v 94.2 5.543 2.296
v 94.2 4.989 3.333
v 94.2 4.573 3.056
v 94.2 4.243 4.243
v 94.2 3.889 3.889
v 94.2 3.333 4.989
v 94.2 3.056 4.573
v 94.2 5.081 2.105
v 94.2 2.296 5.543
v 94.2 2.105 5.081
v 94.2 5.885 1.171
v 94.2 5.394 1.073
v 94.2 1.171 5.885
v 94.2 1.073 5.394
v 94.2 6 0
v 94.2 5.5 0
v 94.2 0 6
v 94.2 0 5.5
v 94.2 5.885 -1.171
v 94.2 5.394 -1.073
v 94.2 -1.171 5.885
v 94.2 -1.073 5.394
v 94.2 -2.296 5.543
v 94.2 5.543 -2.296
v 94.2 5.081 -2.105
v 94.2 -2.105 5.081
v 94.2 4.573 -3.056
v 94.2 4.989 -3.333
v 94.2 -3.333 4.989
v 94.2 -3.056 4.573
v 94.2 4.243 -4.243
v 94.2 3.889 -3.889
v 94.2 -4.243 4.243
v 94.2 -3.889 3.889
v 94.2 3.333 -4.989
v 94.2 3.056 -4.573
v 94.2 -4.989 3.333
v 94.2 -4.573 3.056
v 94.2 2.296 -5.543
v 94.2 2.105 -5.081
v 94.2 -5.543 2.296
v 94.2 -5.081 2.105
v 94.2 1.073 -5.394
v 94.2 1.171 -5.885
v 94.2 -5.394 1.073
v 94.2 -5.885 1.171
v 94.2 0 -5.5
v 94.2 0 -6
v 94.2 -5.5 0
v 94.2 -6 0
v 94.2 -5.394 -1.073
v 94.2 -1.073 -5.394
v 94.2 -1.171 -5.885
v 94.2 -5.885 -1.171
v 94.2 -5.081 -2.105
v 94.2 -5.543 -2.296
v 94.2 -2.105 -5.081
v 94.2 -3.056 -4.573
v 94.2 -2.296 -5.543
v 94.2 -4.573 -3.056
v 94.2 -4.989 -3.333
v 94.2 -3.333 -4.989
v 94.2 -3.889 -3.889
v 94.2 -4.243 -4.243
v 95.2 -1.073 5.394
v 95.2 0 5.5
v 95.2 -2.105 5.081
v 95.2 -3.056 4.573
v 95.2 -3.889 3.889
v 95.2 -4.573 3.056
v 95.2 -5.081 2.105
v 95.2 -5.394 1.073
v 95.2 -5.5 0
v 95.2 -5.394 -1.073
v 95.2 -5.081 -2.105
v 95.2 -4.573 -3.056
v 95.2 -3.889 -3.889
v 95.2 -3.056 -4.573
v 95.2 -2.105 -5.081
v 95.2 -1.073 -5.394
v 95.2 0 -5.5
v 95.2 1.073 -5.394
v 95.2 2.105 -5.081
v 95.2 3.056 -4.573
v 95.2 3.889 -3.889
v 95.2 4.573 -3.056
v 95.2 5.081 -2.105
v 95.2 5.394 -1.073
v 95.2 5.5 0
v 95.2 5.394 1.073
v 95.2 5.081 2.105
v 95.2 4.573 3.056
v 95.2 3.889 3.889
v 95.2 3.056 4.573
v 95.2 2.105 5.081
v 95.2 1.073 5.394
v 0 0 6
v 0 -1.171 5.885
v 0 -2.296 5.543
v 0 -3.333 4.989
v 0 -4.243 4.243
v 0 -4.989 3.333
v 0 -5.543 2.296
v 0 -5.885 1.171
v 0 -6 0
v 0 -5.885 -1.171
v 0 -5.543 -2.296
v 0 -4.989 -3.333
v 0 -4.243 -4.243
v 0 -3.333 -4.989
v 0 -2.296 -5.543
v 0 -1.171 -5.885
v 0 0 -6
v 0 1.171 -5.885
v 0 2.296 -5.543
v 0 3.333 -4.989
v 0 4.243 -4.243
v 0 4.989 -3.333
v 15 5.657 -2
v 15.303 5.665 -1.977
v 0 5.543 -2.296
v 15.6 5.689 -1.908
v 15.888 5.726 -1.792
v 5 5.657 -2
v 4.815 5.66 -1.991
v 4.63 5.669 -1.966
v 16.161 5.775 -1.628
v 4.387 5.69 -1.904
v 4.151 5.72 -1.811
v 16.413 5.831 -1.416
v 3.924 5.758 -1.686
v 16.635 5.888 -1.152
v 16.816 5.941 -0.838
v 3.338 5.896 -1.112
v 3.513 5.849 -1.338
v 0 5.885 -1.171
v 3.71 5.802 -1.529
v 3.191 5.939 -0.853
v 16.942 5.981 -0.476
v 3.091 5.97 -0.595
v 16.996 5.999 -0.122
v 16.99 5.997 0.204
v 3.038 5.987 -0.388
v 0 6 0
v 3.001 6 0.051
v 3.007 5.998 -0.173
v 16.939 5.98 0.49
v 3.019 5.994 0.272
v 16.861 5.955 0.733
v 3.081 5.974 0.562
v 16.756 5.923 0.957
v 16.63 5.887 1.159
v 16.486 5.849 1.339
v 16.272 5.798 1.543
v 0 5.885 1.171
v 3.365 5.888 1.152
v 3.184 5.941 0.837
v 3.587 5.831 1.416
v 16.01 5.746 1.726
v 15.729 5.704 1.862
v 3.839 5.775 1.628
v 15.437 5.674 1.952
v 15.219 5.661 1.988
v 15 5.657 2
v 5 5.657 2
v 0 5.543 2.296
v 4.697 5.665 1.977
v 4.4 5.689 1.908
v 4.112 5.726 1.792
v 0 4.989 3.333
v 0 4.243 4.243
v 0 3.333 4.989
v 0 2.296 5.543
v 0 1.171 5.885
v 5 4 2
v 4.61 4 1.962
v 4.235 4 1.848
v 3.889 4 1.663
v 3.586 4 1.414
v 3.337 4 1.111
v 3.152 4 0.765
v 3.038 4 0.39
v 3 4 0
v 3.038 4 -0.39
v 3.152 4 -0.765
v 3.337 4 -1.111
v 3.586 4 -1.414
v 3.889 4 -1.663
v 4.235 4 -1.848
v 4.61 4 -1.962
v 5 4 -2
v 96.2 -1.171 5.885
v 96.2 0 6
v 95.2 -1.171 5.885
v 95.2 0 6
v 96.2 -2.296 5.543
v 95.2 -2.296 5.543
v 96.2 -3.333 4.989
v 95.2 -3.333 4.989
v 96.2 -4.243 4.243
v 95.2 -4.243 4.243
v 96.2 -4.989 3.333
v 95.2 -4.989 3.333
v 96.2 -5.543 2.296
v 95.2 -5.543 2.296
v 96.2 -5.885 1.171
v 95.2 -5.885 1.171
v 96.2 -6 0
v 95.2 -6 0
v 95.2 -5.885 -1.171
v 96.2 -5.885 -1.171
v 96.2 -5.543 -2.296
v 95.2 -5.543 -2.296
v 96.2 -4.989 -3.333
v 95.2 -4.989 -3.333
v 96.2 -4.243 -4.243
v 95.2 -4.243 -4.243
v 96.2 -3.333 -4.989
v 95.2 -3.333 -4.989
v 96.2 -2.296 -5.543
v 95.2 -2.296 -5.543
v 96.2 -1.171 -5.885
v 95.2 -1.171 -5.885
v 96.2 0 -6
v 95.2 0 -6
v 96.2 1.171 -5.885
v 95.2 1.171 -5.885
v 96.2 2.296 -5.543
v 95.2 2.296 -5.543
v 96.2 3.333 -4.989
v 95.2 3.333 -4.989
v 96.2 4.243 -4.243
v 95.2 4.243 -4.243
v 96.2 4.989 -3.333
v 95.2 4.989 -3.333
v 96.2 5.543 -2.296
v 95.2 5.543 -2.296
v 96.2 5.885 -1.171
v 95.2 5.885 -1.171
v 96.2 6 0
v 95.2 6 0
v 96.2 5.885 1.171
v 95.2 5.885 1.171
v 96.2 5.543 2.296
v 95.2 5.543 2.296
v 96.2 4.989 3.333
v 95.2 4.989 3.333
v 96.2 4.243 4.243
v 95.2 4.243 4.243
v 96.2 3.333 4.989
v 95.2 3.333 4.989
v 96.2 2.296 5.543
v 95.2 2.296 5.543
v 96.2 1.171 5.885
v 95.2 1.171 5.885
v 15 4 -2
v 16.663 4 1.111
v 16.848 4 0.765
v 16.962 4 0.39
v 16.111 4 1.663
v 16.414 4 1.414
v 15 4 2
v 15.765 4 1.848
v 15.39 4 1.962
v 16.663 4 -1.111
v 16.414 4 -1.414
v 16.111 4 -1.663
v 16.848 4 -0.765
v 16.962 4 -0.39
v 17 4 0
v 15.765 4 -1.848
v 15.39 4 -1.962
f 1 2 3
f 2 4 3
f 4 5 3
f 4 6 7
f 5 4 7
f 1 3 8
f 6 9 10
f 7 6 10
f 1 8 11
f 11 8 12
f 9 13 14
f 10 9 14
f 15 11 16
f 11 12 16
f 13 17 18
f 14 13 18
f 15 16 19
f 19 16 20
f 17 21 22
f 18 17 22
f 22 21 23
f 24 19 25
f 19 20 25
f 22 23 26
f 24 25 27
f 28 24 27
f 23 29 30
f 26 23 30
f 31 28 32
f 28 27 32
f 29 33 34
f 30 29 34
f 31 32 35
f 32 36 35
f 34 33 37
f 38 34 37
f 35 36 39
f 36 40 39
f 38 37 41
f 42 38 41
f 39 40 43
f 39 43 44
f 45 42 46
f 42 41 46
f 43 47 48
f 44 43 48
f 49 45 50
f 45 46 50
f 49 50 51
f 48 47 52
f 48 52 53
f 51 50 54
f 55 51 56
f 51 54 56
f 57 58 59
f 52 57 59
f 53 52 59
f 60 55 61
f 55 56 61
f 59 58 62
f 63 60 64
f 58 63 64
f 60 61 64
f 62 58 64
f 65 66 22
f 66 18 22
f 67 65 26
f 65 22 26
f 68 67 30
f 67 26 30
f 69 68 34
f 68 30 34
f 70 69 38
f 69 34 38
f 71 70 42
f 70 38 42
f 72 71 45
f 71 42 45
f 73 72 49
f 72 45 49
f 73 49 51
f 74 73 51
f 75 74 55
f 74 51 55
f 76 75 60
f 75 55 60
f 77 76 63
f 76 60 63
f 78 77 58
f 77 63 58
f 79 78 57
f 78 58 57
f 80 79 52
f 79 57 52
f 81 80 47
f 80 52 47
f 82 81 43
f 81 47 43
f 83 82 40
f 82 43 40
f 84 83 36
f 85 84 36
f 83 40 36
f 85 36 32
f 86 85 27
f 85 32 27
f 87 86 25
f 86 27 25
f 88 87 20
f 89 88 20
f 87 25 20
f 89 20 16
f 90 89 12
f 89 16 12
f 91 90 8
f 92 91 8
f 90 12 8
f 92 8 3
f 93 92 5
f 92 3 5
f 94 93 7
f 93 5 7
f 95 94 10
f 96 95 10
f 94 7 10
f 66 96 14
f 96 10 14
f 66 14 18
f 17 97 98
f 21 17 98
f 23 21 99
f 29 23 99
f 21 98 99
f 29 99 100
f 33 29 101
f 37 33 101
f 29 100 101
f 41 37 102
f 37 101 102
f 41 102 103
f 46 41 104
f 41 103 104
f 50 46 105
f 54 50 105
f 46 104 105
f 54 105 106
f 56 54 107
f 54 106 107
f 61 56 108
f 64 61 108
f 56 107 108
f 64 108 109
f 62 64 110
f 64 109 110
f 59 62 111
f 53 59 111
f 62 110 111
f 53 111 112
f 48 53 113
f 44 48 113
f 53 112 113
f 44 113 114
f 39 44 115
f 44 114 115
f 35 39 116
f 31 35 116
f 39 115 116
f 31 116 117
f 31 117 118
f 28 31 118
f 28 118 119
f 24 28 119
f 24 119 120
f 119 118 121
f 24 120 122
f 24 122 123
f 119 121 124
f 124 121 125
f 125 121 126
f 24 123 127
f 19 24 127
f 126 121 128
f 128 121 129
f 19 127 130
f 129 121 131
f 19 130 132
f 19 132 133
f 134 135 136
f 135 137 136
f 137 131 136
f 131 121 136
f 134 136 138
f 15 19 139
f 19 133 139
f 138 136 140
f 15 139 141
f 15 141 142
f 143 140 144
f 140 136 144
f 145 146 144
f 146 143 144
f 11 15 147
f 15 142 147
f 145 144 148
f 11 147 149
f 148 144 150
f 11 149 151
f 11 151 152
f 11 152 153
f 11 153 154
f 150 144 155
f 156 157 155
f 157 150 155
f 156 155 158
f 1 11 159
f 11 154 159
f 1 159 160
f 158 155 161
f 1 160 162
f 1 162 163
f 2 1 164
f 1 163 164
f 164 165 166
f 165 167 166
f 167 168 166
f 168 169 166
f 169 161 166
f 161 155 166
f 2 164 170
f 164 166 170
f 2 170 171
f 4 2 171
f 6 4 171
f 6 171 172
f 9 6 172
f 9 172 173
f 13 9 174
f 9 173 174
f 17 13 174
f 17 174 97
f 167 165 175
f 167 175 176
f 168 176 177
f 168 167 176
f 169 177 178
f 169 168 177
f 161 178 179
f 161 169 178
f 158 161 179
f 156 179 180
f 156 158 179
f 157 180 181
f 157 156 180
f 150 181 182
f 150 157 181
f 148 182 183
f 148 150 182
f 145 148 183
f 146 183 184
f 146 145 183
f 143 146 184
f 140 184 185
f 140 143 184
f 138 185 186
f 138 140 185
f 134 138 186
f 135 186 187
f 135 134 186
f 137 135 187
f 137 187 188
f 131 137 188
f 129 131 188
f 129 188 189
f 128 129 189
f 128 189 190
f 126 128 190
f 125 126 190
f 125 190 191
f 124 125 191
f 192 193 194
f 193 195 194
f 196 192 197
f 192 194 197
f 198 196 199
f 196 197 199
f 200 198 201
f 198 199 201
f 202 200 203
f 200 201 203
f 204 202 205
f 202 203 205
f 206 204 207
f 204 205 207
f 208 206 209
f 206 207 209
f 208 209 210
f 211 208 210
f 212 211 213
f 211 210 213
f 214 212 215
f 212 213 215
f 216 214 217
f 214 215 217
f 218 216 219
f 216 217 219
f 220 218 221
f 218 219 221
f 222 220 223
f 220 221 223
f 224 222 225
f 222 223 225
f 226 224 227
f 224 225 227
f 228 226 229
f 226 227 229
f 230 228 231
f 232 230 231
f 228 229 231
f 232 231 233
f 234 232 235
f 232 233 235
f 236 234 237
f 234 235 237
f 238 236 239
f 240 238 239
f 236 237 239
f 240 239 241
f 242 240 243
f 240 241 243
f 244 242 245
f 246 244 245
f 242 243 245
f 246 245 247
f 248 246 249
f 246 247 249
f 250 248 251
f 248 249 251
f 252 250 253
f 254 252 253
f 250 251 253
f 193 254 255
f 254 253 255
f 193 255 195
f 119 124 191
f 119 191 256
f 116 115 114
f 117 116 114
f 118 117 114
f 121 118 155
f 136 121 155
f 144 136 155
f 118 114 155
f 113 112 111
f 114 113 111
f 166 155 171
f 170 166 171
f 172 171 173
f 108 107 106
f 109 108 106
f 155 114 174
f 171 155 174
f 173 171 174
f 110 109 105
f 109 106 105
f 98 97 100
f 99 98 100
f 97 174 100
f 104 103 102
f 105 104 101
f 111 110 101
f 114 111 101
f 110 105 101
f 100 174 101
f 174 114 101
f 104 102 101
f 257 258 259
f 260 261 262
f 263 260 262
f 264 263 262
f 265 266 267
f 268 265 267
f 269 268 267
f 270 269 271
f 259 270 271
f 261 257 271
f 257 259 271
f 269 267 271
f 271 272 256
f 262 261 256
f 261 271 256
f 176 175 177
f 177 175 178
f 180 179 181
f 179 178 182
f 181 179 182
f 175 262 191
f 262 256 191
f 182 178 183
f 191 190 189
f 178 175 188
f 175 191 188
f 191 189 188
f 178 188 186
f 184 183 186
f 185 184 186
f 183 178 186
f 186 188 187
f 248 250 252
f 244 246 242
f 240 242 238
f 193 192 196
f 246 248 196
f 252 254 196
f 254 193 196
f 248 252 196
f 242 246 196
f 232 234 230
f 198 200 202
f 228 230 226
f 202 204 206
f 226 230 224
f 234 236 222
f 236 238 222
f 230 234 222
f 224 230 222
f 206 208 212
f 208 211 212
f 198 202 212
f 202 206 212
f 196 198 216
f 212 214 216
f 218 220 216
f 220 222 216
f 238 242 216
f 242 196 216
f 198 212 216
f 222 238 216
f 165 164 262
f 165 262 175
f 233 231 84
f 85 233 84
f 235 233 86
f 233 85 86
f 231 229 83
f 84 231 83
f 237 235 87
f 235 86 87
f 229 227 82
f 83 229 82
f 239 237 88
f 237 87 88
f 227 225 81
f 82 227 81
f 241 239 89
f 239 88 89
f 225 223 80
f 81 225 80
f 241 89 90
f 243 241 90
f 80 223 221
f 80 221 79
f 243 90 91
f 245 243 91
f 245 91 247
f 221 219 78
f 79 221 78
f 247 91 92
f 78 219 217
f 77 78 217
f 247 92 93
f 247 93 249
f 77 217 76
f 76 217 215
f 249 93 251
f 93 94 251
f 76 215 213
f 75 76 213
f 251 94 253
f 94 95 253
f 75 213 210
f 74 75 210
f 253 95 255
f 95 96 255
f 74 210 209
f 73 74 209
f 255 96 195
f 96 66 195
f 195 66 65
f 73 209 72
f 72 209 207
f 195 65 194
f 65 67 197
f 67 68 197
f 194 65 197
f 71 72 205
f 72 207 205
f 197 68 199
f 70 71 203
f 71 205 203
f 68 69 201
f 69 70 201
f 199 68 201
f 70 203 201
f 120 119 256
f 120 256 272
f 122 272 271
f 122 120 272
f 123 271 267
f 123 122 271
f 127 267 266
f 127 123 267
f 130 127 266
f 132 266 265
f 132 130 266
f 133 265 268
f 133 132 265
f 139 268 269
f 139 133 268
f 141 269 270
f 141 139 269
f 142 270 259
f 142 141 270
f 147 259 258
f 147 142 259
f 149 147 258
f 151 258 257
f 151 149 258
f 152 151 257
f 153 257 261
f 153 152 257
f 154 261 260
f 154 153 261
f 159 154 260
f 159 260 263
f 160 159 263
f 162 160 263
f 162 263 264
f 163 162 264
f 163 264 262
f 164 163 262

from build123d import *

# Parameters (mm, degrees)
CUT_EXTRUDE_1_DEPTH = 2


with BuildPart() as part:
    # ｽｹｯﾁ2 → 回転1 (revolve)
    with BuildSketch(Plane.XY, mode=Mode.PRIVATE) as revolve_1_sk:
        Polygon((0, 6), (0, 0), (96.2, 0), (96.2, 6), (95.2, 6), (95.2, 5.5), (94.2, 5.5), (94.2, 6), (2, 6), (1, 6), align=None)
    revolve(revolve_1_sk.sketch.rotate(Axis((0, 0, 0), (1, 0, 0)), 90), axis=Axis((0, 0, 0), (1, 0, 0)))

    # ｽｹｯﾁ4 → ｶｯﾄ - 押し出し1 (cut)
    with BuildSketch(Plane(origin=(0, 6, 0), x_dir=(1, 0, 0), z_dir=(0, 1, 0))):
        with BuildLine():
            Line((5, 2), (15, 2))
            ThreePointArc((15, 2), (17, 0), (15, -2))
            Line((15, -2), (5, -2))
            ThreePointArc((5, -2), (3, 0), (5, 2))
        make_face()
    extrude(amount=-CUT_EXTRUDE_1_DEPTH, mode=Mode.SUBTRACT)


solid = part.part
